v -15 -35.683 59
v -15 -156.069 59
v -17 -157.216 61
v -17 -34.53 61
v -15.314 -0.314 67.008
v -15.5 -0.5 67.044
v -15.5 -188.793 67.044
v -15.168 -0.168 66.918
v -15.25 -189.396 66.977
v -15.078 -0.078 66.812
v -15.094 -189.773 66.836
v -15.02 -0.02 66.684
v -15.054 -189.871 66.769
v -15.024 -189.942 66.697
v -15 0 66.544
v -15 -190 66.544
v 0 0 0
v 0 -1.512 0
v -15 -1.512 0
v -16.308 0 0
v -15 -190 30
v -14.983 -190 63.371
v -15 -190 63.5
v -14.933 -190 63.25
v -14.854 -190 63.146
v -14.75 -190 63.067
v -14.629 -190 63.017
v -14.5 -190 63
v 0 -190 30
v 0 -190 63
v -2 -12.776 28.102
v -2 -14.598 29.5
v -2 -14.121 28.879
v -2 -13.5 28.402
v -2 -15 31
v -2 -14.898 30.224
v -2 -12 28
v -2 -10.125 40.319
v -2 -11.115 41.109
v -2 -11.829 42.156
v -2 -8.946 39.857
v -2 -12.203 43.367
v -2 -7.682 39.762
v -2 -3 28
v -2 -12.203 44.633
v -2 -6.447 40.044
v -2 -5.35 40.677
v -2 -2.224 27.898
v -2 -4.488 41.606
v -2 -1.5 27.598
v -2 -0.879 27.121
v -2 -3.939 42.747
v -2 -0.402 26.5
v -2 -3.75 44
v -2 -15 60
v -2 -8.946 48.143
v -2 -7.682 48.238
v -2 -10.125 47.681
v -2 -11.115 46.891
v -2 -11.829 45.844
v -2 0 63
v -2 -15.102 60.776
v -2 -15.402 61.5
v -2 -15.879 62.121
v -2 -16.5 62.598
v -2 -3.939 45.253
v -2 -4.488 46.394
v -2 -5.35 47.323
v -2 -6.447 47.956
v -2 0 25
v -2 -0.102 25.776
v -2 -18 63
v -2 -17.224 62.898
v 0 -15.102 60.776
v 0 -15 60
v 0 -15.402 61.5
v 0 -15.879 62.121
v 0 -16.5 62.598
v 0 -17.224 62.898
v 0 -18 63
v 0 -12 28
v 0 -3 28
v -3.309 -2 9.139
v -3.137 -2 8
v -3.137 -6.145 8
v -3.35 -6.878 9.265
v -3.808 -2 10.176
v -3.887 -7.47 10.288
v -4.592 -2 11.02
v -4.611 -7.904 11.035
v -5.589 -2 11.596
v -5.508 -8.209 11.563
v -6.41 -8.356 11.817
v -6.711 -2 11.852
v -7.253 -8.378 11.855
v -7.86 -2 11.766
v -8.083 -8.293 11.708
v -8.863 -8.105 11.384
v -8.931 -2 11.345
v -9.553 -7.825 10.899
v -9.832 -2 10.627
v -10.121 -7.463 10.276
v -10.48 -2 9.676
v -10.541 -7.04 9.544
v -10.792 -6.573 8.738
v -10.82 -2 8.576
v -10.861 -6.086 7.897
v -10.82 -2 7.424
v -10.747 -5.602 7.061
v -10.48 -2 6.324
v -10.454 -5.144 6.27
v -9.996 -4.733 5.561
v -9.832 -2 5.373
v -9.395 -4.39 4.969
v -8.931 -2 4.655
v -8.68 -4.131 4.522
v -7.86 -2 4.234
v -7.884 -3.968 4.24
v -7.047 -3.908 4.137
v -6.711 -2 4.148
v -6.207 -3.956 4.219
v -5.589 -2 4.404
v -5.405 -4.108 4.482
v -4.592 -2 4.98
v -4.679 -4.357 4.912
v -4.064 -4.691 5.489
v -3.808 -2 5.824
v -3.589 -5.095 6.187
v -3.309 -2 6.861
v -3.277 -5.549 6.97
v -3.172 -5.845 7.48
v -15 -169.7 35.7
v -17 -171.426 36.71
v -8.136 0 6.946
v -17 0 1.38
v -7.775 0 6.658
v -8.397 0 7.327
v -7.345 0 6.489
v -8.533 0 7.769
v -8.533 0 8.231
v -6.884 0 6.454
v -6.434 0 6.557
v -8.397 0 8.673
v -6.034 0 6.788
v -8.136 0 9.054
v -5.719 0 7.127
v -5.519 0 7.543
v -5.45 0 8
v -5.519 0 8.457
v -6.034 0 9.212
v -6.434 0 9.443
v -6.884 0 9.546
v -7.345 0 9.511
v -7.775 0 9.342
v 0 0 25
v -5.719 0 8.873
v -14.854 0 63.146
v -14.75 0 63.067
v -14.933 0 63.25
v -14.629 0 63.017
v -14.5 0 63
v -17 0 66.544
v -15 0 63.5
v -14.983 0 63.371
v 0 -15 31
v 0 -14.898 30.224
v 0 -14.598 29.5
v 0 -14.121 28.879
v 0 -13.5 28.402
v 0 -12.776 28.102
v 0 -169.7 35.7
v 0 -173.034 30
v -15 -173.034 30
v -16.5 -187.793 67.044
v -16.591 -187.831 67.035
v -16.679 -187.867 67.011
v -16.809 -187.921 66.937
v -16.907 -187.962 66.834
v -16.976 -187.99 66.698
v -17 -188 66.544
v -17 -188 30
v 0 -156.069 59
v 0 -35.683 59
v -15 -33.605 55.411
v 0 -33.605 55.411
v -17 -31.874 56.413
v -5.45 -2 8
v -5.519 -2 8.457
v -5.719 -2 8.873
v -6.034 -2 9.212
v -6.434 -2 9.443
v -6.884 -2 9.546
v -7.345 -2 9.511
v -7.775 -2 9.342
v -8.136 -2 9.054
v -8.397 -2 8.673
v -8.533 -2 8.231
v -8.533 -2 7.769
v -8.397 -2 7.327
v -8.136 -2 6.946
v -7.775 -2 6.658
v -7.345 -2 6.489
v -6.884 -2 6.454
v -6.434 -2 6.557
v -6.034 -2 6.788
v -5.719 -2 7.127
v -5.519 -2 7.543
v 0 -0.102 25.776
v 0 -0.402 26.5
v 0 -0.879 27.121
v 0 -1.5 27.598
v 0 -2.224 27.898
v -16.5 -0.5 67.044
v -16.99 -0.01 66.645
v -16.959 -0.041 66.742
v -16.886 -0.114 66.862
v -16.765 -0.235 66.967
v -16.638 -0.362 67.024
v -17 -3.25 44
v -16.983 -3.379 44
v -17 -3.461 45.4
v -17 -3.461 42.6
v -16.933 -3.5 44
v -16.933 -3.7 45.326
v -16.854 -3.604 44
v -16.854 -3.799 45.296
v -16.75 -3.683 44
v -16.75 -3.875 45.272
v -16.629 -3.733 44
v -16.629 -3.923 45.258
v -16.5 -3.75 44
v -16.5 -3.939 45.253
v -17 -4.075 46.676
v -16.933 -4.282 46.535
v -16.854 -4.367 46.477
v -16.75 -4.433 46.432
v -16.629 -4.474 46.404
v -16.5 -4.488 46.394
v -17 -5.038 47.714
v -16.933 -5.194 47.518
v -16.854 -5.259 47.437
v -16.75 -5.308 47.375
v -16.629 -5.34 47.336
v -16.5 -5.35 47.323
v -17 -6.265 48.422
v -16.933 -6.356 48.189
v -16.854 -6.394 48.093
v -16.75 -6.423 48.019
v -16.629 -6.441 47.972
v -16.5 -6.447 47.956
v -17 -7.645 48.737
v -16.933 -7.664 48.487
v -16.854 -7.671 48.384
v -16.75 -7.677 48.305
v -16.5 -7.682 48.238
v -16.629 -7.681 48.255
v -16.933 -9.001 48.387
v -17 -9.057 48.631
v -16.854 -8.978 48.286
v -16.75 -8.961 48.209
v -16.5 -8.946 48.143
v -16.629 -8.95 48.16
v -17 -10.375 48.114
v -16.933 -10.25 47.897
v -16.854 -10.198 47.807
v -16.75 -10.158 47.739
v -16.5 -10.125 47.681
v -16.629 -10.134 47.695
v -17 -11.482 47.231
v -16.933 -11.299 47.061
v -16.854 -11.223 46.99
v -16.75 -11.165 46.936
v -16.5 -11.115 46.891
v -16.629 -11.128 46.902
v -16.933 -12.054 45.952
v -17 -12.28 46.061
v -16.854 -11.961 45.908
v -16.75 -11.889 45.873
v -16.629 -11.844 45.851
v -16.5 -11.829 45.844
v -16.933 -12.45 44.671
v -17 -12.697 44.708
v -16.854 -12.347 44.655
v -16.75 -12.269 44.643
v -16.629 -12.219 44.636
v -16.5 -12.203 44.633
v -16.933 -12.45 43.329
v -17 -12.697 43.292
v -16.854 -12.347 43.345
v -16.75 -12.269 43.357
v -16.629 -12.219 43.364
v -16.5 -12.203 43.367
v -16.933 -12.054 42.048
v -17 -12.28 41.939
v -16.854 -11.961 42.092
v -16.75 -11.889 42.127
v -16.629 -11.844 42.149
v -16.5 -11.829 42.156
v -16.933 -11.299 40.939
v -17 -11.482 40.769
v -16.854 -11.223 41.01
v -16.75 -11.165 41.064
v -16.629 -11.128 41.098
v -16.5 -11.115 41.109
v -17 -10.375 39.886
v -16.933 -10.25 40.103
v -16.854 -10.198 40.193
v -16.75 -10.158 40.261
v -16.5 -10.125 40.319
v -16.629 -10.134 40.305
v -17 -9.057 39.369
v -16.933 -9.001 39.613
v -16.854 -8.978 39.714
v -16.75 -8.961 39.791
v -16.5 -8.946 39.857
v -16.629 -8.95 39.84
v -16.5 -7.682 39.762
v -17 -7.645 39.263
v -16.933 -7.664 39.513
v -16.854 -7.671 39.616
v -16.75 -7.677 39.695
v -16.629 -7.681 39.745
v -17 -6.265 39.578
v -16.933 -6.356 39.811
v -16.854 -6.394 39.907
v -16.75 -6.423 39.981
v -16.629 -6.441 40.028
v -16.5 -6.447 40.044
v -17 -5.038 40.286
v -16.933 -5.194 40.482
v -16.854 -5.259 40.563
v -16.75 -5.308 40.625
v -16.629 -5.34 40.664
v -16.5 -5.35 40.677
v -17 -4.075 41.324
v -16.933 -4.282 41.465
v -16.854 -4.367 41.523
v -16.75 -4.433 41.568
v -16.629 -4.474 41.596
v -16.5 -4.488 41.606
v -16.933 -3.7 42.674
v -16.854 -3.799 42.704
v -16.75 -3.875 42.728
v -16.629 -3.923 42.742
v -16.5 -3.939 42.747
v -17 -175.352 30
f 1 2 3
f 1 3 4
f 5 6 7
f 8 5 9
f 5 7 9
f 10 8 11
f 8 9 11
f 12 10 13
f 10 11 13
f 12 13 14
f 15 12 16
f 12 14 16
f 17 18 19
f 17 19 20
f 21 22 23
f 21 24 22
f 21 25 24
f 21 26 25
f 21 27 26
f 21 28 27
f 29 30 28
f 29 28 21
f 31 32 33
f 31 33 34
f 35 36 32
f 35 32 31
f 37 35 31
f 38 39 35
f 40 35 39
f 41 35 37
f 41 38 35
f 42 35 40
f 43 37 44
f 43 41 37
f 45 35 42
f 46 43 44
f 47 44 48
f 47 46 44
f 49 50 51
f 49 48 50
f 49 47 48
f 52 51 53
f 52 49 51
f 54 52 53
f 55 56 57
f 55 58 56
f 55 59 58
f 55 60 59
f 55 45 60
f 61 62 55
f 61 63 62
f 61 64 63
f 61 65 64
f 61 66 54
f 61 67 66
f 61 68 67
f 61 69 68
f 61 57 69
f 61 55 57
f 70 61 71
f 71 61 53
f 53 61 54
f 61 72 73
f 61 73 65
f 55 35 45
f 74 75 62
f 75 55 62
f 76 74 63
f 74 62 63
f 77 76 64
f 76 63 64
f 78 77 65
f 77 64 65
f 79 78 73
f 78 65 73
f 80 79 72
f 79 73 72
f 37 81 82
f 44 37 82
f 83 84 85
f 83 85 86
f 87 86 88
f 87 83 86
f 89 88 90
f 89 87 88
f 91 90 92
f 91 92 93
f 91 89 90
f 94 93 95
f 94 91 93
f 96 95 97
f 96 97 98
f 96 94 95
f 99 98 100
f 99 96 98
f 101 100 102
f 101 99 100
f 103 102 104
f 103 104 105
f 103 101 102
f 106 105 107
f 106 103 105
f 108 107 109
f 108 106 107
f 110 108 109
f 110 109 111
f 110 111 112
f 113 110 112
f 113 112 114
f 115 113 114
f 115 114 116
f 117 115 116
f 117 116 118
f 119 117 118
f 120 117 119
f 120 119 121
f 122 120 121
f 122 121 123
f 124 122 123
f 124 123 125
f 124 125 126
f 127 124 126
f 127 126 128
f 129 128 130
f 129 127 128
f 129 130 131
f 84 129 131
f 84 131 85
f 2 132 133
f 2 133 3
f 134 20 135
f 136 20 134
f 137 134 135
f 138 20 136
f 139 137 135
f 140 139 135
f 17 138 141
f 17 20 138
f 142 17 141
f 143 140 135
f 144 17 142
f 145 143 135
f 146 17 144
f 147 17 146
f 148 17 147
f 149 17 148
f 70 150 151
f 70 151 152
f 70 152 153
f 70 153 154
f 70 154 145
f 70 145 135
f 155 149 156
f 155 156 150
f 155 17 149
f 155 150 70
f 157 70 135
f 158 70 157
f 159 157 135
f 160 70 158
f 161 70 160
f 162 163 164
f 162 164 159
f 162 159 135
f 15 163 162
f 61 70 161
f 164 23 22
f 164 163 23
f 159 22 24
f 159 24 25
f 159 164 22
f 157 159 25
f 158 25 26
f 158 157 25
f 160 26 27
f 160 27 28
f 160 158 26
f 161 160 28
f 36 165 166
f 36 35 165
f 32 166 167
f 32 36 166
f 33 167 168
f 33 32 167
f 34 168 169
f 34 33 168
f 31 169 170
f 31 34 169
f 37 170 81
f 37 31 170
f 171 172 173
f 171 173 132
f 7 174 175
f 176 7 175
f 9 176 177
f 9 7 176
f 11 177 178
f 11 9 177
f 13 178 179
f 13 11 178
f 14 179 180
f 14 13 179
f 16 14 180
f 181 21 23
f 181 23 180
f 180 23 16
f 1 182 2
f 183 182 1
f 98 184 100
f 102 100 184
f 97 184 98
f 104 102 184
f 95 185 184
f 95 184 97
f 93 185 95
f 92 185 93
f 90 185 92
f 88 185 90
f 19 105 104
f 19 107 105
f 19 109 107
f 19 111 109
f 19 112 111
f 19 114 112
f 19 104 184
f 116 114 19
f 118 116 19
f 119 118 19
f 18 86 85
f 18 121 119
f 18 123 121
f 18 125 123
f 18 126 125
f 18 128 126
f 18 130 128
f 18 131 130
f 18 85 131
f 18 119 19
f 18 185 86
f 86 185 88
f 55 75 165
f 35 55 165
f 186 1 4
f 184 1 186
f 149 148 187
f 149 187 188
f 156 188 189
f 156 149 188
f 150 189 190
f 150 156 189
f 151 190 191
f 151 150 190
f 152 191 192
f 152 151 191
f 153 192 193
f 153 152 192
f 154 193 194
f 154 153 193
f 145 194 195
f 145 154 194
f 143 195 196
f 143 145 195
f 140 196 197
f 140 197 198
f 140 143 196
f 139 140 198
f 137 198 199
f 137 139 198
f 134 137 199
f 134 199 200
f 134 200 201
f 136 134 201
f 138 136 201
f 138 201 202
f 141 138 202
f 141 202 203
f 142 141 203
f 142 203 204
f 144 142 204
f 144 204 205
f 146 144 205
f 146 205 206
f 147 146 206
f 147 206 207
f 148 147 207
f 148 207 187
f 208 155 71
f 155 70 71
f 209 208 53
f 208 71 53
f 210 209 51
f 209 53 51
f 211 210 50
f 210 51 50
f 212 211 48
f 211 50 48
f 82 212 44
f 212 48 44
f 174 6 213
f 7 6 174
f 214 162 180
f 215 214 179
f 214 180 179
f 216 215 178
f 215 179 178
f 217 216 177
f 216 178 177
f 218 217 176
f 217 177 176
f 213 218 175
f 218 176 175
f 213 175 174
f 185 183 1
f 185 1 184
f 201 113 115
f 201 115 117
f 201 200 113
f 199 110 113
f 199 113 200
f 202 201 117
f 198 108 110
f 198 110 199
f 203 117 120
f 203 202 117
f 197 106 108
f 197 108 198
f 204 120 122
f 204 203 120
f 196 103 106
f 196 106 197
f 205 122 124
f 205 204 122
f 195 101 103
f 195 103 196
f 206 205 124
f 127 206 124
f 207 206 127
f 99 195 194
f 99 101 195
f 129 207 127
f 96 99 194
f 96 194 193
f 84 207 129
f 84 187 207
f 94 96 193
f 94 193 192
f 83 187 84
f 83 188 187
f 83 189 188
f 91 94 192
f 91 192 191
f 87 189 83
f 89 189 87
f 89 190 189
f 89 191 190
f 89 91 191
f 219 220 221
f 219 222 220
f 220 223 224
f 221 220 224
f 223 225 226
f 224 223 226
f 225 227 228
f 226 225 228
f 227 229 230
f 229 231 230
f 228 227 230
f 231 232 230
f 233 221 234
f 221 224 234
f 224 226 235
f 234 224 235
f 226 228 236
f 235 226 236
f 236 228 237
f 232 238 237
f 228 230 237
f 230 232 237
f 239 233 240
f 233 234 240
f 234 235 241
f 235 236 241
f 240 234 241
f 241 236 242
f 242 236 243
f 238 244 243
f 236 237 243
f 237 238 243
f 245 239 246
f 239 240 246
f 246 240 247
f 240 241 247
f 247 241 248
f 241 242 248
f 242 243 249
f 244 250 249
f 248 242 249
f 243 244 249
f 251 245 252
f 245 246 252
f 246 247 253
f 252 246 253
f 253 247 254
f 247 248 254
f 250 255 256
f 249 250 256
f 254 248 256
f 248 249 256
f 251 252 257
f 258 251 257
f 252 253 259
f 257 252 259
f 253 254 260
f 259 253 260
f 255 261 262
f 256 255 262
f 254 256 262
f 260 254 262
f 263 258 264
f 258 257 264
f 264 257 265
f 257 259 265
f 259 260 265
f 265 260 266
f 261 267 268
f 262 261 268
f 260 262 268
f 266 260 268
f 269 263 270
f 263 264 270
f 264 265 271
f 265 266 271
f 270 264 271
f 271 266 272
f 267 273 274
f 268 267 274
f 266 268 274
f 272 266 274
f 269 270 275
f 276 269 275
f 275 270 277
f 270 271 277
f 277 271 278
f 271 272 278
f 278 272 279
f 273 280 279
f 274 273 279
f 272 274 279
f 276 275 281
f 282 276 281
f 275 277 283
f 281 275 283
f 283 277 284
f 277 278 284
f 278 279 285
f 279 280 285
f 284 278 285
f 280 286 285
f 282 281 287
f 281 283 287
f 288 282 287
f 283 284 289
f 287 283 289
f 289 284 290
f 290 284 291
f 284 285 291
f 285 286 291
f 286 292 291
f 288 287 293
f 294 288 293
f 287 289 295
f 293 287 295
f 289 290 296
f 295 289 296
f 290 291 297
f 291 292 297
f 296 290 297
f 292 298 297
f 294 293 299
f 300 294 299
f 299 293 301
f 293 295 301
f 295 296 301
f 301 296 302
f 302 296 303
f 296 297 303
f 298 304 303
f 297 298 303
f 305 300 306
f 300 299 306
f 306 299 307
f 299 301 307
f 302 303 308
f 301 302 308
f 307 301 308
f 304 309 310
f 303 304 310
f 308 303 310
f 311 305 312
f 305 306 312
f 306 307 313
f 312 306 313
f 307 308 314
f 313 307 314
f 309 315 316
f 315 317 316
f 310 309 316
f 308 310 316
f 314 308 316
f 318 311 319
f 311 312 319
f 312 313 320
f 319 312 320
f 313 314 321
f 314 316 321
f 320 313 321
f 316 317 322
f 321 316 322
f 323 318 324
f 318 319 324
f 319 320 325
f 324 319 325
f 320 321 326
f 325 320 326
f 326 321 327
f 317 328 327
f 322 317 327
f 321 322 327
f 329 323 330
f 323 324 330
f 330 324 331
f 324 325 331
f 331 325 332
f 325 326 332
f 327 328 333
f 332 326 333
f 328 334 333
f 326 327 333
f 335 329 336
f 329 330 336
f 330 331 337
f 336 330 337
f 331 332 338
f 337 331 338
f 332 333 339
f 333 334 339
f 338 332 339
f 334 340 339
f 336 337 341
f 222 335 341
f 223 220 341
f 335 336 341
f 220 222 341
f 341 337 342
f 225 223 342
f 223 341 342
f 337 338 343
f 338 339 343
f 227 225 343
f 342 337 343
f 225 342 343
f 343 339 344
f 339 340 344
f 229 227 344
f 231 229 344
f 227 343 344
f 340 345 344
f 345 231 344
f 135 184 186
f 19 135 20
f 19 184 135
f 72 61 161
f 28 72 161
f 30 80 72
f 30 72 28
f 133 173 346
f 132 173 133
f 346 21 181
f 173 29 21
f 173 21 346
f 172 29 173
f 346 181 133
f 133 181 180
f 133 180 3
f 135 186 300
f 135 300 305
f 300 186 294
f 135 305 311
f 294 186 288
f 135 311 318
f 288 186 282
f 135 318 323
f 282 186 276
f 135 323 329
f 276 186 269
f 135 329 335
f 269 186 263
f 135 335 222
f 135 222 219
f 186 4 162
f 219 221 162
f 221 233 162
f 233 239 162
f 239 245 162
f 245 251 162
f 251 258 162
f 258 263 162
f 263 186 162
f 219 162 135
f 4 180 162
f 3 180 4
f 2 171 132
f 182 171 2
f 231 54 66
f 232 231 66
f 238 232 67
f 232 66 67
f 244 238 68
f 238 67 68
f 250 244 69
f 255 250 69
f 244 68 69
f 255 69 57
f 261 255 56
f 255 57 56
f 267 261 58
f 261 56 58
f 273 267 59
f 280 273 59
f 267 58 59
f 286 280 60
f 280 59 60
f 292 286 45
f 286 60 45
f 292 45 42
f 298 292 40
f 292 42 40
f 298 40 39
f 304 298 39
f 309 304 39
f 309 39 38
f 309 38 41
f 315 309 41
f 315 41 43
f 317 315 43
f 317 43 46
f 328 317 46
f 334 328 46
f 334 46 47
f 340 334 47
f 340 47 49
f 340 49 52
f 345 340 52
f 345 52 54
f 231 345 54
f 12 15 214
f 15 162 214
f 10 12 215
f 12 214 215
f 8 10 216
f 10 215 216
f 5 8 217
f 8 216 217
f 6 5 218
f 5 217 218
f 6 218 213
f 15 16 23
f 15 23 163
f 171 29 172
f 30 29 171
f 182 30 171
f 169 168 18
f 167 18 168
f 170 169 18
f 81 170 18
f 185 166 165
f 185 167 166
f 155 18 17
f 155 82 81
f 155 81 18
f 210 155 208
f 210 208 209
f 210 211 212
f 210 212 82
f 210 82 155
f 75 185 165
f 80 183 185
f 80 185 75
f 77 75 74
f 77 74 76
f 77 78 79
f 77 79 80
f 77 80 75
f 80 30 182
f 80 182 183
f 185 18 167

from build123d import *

# Parameters (mm, degrees)
F1_W     = 15
F1_H     = 27.4107800126
F1_R     = 4.25
F1_H_2   = 3.5892199874
F1_H_3   = 4
F2_DEPTH = 17
F3_DEPTH = 2
F4_START = -15
F1_H_4   = 4.0437440276
F4_DEPTH = 2
F5_R     = 3
F0_R     = 1.55
F6_DEPTH = 25
F7_START = 2
F0_R_2   = 3.8628325464
F7_DEPTH = 23
F8_SIZE  = 2
F9_R     = 0.5


with BuildPart() as f2:
    # F1 (on Right) → F2 (new body)
    with BuildSketch(Plane.YZ):
        Polygon((-1.5120996646, 0), (0, 0), (0, 28), (-15, 28), (-15, 55.4107800126), (-33.6045285314, 55.4107800126), align=None)
        with Locations((-7.5, 41.7053900063)):
            Rectangle(F1_W, F1_H)
        with Locations((-8, 44)):
            Circle(F1_R, mode=Mode.SUBTRACT)
        with Locations((-7.5, 57.2053900063)):
            Rectangle(F1_W, F1_H_2)
        Polygon((-35.6833079152, 59), (-33.6045285314, 55.4107800126), (-15, 55.4107800126), (-15, 59), align=None)
        Polygon((-38, 63), (-35.6833079152, 59), (-15, 59), (-15, 63), align=None)
        with Locations((-7.5, 61)):
            Rectangle(F1_W, F1_H_3)
        Polygon((-156.0687124729, 59), (-35.6833079152, 59), (-38, 63), (-190, 63), (-190, 59), align=None)
        Polygon((-169.6997248952, 35.7001498342), (-156.0687124729, 59), (-190, 59), (-190, 35.7001498342), align=None)
        Polygon((-173.0344593525, 30), (-169.6997248952, 35.7001498342), (-190, 35.7001498342), (-190, 30), align=None)
    extrude(amount=-F2_DEPTH)

    # F1 (on Right) → F3 (cut)
    with BuildSketch(Plane.YZ):
        with Locations((-7.5, 41.7053900063)):
            Rectangle(F1_W, F1_H)
        with Locations((-8, 44)):
            Circle(F1_R, mode=Mode.SUBTRACT)
        with Locations((-7.5, 57.2053900063)):
            Rectangle(F1_W, F1_H_2)
        with Locations((-7.5, 61)):
            Rectangle(F1_W, F1_H_3)
    extrude(amount=-F3_DEPTH, mode=Mode.SUBTRACT)

    # F1 (on Right) → F4 (join)
    with BuildSketch(Plane.YZ.offset(F4_START)):
        Polygon((-190, 63), (-38, 63), (-15, 63), (-15, 67.0437440276), (-190, 67.0437440276), align=None)
        with Locations((-7.5, 65.0218720138)):
            Rectangle(F1_W, F1_H_4)
    extrude(amount=-F4_DEPTH)

    # F5
    f5_edges = [f2.edges().sort_by_distance(p)[0] for p in [
        (-1, -15, 28),
        (-1, -15, 63),
        (-1, 0, 28),
    ]]
    fillet(f5_edges, radius=F5_R)

    # F0 (on Front) → F6 (cut)
    with BuildSketch(Plane.XZ):
        with Locations((-7, 8)):
            Circle(F0_R)
    extrude(amount=F6_DEPTH, mode=Mode.SUBTRACT)

    # F0 (on Front) → F7 (cut)
    with BuildSketch(Plane.XZ.offset(F7_START)):
        with Locations((-7, 8)):
            Circle(F0_R_2)
        with Locations((-7, 8)):
            Circle(F0_R, mode=Mode.SUBTRACT)
    extrude(amount=F7_DEPTH, mode=Mode.SUBTRACT)

    # F8
    f8_edges = [f2.edges().sort_by_distance(p)[0] for p in [
        (-17, -18.597704, 29.5),
        (-17, -95.87601, 59),
        (-17, -164.551586, 44.5),
        (-17, -190, 48.521872),
    ]]
    chamfer(f8_edges, length=F8_SIZE)

    # F9
    f9_edges = [f2.edges().sort_by_distance(p)[0] for p in [
        (-15, -95, 63),
        (-15, -95, 67.043744),
        (-17, -94, 67.043744),
        (-16, -189, 67.043744),
        (-16, 0, 67.043744),
        (-17, -12.25, 44),
    ]]
    fillet(f9_edges, radius=F9_R)


solid = f2.part
